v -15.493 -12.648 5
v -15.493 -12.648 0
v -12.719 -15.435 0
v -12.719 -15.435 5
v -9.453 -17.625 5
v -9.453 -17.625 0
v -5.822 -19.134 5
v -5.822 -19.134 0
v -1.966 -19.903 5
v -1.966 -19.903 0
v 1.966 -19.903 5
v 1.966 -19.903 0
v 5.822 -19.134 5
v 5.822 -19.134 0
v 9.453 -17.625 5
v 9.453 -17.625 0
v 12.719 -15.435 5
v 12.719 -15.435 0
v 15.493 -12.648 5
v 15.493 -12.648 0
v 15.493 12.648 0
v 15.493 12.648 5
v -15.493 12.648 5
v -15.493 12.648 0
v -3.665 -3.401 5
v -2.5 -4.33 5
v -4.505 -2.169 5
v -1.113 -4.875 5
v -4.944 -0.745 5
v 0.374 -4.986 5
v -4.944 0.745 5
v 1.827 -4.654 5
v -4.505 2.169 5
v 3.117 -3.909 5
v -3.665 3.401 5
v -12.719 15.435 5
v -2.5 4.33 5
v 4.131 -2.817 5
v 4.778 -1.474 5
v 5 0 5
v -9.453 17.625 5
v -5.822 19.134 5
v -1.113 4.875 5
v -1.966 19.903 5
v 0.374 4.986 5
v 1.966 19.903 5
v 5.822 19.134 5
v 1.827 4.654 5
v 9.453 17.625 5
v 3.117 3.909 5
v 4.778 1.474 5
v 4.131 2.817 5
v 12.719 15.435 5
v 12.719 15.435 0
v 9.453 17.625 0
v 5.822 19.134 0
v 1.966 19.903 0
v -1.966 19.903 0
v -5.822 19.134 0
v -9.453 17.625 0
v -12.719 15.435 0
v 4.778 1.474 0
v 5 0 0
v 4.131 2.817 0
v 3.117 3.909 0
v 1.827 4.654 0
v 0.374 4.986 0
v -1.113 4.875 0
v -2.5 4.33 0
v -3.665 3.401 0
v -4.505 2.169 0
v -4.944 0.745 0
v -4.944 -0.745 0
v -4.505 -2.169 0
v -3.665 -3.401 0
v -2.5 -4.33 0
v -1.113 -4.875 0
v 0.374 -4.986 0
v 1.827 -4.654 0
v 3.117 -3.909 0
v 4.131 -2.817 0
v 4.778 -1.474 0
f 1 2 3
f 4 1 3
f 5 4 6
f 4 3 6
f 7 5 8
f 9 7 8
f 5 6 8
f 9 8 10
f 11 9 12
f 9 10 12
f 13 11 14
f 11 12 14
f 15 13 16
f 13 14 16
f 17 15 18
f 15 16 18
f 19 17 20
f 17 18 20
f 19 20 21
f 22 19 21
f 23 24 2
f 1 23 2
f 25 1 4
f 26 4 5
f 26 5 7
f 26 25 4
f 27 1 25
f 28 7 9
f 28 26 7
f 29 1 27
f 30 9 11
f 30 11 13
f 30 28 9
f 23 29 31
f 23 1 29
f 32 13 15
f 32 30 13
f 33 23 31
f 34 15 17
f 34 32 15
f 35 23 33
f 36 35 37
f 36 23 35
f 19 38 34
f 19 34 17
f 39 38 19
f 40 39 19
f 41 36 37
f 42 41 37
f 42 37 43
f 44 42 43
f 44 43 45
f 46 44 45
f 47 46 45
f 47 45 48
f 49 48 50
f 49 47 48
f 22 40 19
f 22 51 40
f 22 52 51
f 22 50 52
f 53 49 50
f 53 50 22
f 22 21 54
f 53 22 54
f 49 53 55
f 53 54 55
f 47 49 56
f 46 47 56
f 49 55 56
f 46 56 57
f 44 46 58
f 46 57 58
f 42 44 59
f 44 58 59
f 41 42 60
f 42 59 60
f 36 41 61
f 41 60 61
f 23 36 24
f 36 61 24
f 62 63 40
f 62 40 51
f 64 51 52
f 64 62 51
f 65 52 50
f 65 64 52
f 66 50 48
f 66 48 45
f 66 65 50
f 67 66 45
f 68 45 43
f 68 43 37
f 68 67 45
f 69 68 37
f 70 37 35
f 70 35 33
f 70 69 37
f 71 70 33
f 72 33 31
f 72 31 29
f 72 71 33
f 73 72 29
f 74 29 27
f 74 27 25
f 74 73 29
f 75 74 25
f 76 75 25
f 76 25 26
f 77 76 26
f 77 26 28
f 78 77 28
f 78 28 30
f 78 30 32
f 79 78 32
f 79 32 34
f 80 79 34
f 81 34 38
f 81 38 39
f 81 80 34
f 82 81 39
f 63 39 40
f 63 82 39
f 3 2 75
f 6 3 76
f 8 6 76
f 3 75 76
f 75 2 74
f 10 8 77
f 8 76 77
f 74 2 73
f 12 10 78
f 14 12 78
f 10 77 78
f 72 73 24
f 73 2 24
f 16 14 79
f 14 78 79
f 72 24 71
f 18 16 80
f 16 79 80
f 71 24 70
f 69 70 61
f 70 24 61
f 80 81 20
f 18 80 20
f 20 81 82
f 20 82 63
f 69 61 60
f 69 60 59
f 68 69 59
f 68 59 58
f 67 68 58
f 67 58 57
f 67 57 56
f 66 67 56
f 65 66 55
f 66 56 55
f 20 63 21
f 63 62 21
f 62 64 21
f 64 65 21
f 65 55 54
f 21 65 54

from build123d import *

# Parameters (mm, degrees)
SKETCH1_R           = 5
BOSS_EXTRUDE1_DEPTH = 5


with BuildPart() as part:
    # Sketch1 → Boss-Extrude1 (new body)
    with BuildSketch(Plane.XY):
        with BuildLine():
            Line((-15.492752905, 12.648106871), (-15.492752905, -12.648106871))
            ThreePointArc((-15.492752905, -12.648106871), (0, -20), (15.492752905, -12.648106871))
            Line((15.492752905, -12.648106871), (15.492752905, 12.648106871))
            ThreePointArc((15.492752905, 12.648106871), (0, 20), (-15.492752905, 12.648106871))
        make_face()
        Circle(SKETCH1_R, mode=Mode.SUBTRACT)
    extrude(amount=BOSS_EXTRUDE1_DEPTH)


solid = part.part
